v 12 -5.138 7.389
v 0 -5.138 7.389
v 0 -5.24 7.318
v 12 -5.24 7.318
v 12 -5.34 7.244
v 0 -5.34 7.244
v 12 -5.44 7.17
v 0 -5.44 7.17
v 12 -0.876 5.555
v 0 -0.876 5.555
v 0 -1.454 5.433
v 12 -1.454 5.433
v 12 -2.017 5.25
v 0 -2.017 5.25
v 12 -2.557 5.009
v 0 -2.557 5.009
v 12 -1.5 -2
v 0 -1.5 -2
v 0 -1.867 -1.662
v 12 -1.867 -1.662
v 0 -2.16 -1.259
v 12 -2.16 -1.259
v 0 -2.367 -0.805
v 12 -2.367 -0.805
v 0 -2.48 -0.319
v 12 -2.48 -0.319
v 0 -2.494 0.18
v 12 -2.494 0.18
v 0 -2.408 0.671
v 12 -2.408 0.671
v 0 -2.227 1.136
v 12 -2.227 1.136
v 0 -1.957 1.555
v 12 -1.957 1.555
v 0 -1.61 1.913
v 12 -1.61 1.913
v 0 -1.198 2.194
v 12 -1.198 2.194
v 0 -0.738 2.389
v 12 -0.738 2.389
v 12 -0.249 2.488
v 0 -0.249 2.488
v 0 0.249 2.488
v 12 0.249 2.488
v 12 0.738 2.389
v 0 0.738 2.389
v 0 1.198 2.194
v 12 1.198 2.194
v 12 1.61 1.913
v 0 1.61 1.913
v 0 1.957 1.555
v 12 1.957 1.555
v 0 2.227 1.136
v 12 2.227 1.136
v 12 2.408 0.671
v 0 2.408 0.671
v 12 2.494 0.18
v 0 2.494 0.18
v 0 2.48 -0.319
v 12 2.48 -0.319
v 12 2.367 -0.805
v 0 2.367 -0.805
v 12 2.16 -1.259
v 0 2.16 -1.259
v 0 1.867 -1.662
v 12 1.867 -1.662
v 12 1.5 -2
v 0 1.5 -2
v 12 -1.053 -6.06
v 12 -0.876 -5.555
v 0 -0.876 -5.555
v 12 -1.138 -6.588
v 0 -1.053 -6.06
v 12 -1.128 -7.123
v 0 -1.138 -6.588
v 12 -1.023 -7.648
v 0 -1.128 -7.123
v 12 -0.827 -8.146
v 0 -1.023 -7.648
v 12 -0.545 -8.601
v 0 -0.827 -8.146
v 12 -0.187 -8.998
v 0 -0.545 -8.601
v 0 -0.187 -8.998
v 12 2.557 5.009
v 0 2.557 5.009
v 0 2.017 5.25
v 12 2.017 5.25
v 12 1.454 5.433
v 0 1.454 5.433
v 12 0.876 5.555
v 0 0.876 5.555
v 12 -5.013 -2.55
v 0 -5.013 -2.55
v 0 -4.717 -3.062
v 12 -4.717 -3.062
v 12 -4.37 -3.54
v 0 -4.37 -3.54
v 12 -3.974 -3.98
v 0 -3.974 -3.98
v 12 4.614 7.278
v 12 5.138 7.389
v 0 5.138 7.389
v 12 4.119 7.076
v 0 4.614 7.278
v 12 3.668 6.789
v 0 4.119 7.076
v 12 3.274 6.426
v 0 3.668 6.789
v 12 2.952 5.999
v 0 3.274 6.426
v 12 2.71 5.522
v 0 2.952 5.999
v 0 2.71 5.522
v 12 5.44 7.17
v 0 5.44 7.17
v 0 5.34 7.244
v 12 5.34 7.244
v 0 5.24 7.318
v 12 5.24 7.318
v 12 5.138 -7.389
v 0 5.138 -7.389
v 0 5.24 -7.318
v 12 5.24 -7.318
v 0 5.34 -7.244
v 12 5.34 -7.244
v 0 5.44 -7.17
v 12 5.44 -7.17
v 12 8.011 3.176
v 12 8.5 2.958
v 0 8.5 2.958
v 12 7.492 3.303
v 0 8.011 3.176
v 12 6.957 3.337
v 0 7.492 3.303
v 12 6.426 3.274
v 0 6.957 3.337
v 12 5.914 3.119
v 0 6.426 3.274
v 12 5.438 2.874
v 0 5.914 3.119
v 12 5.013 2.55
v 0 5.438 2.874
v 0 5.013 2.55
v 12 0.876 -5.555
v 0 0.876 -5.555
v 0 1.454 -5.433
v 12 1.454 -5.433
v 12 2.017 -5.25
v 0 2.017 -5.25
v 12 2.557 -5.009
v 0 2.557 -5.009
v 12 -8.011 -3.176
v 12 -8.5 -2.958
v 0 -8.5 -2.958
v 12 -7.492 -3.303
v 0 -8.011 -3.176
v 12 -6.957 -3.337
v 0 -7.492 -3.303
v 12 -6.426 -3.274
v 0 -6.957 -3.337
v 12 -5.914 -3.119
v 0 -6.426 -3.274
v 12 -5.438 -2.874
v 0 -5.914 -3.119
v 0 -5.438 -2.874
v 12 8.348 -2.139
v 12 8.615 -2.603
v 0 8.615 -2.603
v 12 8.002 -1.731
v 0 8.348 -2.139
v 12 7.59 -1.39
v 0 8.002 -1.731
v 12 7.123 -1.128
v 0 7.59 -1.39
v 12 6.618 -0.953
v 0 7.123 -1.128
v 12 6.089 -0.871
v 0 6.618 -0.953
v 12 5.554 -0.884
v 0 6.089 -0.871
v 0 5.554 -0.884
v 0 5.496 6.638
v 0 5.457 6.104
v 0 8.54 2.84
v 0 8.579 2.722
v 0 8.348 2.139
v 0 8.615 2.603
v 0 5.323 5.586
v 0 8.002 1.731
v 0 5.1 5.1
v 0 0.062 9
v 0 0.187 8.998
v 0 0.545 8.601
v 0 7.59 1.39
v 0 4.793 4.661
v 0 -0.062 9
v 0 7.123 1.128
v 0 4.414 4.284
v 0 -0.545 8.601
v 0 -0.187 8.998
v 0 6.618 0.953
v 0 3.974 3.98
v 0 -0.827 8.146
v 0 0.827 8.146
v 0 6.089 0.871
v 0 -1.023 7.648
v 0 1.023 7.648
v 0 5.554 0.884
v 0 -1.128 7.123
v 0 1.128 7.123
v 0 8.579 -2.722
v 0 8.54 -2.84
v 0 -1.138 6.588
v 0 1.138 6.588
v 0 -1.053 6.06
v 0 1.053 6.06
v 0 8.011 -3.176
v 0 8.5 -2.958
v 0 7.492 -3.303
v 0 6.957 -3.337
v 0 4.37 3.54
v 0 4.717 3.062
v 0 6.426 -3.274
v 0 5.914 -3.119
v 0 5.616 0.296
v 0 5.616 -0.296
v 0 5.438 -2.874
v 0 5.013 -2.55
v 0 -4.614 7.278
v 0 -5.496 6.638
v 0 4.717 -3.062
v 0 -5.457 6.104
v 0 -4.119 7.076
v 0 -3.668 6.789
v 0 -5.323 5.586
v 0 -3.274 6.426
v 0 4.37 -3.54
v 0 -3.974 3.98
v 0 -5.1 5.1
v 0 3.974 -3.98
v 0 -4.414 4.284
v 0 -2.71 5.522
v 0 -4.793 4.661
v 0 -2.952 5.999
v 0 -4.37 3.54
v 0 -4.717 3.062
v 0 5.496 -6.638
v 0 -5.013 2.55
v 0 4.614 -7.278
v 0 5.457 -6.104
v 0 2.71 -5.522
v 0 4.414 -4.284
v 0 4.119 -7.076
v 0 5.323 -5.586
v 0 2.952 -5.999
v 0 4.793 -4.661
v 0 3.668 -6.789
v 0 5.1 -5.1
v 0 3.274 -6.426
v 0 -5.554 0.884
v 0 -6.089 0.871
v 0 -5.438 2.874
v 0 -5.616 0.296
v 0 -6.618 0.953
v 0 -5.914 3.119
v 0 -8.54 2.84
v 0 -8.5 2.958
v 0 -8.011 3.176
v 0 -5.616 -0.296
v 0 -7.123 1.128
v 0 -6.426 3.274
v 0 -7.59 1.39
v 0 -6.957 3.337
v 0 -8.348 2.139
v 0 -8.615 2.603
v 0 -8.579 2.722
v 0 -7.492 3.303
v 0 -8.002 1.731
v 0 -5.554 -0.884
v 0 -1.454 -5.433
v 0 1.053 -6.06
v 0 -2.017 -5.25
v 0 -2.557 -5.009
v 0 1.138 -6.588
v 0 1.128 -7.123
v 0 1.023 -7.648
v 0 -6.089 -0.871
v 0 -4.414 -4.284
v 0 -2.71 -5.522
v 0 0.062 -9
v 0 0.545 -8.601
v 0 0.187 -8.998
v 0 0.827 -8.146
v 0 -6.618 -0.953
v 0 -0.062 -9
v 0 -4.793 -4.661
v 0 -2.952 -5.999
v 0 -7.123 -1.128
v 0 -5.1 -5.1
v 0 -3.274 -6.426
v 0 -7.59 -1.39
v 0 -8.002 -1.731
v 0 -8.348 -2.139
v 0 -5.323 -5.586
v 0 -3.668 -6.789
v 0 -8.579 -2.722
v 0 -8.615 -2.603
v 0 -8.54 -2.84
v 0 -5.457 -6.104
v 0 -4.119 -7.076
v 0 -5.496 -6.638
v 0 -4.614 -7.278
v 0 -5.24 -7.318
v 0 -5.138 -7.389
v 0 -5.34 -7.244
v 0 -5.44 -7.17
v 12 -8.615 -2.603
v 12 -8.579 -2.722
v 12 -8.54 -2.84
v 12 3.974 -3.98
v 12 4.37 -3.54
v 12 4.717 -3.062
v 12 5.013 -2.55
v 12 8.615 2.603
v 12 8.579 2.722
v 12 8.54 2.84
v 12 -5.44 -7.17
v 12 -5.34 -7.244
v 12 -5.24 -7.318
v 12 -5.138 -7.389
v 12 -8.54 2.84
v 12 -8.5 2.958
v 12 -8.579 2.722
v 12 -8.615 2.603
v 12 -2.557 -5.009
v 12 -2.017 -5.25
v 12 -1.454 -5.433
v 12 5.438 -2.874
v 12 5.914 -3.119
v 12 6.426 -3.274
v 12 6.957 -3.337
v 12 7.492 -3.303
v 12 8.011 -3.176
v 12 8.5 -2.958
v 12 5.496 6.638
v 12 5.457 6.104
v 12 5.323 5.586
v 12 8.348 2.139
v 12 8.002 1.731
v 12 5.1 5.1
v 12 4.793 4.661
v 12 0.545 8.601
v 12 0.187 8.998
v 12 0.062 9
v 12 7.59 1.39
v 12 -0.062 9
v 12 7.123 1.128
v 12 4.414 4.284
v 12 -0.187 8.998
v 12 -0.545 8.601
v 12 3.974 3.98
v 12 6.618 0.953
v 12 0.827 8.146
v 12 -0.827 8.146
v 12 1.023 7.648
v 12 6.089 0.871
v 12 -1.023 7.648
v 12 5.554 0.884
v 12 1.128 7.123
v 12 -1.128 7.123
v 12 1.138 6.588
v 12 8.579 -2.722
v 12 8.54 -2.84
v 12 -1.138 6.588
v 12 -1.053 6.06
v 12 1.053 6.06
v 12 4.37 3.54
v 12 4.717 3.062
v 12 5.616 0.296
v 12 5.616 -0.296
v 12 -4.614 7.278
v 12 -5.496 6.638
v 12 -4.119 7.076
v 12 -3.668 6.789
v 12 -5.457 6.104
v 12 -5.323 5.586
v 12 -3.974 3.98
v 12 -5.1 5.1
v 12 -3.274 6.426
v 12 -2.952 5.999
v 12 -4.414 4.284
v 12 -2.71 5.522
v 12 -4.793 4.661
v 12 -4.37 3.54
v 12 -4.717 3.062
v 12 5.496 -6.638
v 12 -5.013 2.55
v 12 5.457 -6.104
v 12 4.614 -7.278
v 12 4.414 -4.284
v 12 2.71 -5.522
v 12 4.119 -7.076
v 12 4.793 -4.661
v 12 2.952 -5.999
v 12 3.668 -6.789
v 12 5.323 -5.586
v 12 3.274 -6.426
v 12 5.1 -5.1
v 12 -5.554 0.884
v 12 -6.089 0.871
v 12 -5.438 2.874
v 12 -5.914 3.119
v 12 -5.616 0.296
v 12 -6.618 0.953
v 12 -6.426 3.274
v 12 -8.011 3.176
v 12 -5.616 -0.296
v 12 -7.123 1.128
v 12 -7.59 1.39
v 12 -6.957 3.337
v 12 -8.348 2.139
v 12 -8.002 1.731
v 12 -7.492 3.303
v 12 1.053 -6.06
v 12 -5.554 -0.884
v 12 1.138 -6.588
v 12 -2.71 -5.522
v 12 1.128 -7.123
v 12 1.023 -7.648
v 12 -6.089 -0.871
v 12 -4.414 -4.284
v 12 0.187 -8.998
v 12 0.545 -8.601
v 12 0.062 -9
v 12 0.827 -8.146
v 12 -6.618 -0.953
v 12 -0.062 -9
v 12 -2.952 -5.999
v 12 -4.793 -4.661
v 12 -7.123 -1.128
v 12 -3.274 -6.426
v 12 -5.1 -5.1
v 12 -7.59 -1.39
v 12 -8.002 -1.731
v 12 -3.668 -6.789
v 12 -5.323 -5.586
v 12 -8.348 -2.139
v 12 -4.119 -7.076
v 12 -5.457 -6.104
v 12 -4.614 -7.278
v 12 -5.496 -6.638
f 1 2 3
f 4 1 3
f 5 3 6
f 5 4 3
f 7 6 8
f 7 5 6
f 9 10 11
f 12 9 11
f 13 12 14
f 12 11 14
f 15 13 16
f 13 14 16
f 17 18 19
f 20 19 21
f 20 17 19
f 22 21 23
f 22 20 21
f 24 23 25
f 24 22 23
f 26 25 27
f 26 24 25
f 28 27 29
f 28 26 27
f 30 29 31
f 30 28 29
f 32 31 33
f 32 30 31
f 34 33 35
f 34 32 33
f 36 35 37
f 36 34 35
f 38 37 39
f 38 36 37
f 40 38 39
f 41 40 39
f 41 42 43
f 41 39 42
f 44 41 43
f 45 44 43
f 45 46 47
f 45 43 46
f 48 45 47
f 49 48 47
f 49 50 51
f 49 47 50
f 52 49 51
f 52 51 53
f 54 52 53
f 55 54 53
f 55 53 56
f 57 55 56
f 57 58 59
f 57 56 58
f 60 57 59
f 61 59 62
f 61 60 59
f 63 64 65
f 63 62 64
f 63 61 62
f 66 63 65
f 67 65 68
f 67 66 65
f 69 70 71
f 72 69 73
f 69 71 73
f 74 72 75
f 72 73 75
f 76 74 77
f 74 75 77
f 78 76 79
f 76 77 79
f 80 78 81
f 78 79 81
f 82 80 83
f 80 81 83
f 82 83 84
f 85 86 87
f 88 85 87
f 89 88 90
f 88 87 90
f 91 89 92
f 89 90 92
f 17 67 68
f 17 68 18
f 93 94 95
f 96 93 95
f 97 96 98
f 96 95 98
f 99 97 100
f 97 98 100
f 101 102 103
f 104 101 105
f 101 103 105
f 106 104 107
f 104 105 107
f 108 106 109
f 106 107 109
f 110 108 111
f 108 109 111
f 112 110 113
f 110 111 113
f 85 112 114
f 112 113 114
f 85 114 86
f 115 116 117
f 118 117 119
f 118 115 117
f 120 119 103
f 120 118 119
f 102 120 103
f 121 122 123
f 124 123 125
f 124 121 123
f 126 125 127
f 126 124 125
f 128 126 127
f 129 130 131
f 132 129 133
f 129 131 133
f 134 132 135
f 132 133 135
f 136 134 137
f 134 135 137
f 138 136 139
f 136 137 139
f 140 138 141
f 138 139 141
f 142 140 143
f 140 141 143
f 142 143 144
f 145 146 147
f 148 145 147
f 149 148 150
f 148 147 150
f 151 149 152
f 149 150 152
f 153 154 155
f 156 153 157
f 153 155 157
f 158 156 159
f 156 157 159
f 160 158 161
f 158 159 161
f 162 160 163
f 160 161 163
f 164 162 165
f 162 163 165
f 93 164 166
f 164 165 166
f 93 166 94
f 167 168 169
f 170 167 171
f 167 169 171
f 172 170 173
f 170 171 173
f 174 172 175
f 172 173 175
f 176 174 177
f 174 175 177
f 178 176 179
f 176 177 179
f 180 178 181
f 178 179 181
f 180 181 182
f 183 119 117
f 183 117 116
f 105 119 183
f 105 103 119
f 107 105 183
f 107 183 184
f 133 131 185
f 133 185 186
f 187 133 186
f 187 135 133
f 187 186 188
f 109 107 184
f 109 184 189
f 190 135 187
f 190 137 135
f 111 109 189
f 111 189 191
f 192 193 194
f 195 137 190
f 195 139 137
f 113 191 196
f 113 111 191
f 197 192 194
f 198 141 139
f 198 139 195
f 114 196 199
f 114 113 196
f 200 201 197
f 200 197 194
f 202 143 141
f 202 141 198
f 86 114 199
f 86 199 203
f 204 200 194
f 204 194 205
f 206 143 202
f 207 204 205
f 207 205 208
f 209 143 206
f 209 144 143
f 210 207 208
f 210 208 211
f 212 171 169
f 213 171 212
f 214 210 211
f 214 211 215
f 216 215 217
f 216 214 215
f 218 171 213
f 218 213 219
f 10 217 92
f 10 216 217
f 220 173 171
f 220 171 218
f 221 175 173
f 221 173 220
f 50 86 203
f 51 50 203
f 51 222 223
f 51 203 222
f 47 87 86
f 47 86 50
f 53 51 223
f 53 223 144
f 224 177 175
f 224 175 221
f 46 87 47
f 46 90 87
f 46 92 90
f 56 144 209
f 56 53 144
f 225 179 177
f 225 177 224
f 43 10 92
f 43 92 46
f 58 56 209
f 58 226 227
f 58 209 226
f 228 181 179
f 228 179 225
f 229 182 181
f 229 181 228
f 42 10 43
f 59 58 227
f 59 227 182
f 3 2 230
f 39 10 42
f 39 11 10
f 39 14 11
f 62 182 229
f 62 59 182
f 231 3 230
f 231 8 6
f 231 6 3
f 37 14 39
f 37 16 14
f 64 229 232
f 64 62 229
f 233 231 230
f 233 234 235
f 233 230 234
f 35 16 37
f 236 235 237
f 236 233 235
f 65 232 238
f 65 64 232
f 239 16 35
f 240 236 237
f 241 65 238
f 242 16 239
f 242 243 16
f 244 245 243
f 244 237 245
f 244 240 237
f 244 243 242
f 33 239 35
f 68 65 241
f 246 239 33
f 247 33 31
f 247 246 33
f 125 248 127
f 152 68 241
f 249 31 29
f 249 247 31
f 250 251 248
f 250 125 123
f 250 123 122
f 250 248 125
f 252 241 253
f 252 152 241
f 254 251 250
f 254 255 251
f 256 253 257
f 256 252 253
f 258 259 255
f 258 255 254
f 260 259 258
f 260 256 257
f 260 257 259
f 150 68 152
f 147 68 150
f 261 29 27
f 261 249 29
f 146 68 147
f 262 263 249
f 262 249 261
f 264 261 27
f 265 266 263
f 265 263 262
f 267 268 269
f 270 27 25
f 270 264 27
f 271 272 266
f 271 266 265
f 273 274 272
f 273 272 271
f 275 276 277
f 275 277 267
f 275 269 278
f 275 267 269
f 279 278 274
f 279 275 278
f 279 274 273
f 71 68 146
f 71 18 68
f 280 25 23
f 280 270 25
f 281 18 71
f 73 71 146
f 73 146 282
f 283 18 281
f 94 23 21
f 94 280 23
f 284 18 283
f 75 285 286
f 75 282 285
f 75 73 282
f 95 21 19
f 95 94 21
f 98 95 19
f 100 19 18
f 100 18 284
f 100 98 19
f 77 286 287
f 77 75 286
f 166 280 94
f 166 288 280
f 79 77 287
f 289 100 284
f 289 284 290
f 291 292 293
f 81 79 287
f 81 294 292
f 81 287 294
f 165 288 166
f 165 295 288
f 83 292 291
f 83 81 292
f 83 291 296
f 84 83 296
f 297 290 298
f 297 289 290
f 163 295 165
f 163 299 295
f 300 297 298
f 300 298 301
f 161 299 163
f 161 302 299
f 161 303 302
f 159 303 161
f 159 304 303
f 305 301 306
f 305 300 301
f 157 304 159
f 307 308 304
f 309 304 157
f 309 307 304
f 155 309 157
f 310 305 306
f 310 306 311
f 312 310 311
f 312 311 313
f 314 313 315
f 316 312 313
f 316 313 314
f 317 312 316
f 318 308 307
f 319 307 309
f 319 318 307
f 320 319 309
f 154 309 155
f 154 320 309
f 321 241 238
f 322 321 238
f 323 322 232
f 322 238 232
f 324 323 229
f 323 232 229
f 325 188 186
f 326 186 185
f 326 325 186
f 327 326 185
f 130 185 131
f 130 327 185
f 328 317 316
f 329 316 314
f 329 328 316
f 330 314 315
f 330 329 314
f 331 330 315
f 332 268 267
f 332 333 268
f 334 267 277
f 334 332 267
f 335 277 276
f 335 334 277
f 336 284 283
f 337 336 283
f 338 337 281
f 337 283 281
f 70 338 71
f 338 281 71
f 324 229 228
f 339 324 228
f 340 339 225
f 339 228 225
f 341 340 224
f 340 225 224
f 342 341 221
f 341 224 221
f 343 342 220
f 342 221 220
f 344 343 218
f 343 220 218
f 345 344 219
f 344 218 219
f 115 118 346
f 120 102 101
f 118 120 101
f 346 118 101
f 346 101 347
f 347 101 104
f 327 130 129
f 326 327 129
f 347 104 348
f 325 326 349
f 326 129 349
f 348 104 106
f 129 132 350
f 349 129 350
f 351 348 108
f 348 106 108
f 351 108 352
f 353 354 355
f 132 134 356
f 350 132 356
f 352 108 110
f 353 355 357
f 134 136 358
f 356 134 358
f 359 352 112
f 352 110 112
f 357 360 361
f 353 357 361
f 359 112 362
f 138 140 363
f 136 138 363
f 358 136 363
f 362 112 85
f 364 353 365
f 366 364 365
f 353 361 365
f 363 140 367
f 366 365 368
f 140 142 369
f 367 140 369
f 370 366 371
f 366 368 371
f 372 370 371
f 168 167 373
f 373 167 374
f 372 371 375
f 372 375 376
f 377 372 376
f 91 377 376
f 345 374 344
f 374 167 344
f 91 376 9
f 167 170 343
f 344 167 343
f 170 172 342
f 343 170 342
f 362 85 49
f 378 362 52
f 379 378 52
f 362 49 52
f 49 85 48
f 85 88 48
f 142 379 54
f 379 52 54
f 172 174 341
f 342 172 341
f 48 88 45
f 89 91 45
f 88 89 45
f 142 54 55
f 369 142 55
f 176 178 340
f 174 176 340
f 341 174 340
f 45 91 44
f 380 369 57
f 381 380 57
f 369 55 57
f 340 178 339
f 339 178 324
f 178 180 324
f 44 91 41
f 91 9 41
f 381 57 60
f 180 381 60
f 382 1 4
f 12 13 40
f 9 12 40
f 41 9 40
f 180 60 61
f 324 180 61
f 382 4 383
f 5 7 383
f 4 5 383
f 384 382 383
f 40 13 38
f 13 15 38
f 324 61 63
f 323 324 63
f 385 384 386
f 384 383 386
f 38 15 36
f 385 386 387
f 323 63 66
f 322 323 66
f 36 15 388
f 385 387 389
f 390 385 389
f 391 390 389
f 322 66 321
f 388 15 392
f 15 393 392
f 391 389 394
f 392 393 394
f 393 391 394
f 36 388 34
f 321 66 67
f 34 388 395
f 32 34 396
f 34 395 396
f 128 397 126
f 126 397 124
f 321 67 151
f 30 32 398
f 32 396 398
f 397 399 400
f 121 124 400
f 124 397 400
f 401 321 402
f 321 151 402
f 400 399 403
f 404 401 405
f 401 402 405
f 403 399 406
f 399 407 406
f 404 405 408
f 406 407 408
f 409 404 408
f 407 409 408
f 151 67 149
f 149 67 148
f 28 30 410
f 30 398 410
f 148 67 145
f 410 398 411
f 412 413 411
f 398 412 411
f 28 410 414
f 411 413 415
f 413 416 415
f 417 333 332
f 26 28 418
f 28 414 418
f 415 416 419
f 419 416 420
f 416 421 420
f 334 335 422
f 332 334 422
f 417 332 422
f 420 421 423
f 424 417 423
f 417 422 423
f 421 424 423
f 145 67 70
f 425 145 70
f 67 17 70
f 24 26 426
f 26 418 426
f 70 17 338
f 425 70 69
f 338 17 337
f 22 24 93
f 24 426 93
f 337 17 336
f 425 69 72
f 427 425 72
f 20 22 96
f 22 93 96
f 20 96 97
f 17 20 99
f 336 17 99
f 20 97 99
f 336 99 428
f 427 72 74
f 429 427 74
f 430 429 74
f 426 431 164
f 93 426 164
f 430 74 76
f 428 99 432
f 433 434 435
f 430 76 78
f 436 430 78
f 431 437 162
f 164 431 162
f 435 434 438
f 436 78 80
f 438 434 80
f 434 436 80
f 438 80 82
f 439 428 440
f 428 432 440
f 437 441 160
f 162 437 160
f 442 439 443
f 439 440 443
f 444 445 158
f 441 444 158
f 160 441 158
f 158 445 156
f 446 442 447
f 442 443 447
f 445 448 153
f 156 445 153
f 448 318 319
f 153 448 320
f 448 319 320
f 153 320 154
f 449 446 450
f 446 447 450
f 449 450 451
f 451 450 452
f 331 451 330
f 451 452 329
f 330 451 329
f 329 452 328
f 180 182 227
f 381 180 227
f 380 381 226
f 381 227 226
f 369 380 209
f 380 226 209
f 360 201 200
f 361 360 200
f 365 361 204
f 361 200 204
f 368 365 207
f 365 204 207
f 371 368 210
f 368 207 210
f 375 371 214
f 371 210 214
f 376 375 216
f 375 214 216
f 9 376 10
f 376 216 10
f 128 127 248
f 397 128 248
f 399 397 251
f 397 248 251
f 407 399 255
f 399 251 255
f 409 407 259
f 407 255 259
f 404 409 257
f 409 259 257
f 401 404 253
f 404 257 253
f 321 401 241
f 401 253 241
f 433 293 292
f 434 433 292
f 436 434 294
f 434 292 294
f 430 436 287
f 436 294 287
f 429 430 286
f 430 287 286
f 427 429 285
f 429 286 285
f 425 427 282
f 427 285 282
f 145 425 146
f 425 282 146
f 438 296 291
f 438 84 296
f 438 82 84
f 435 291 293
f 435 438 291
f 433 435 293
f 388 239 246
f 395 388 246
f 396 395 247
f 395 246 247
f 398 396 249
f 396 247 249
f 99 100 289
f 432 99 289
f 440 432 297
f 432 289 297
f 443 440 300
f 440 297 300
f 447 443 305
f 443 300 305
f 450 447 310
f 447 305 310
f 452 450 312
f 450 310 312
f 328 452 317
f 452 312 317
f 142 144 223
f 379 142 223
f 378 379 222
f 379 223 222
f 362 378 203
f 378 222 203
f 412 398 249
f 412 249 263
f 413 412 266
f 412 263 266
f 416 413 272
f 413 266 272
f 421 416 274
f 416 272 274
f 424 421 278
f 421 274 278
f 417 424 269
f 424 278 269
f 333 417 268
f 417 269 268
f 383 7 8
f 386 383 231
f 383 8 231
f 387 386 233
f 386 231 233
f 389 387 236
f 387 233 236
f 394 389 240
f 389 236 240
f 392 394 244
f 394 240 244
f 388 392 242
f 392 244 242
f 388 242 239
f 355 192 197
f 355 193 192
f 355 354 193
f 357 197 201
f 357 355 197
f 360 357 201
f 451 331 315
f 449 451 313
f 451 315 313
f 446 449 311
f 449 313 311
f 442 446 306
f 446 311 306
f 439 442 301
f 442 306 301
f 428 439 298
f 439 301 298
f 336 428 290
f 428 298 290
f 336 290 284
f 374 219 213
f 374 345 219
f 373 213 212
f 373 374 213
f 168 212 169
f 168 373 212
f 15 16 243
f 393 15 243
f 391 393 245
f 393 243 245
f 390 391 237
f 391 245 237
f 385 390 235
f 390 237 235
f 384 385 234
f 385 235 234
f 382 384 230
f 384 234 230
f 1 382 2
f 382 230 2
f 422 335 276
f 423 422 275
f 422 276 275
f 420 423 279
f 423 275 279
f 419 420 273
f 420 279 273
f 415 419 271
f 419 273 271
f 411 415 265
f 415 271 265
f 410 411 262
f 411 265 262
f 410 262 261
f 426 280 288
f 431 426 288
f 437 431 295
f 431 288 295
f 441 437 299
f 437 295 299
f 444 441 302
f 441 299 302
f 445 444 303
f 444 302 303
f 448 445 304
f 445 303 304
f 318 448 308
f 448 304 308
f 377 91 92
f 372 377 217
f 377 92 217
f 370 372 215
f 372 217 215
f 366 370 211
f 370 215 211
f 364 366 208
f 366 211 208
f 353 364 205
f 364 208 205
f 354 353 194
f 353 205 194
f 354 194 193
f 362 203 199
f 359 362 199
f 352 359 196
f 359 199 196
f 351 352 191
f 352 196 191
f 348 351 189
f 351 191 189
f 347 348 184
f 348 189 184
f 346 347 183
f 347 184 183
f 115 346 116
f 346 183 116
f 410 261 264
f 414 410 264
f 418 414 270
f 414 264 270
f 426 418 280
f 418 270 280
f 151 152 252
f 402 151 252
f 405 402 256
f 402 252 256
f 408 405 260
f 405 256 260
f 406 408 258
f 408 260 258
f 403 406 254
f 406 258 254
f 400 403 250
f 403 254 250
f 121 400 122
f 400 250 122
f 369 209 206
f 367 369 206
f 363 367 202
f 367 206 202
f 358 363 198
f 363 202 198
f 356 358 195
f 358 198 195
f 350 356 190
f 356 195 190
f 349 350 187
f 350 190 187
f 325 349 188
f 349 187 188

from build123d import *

# Parameters (mm, degrees)
BASPROSKE_W        = 12
BASPROSKE_H        = 9
TOOTHCUT_DEPTH     = 18.492855685
TEETHCUTS_COUNT    = 10
TEETHCUTS_ANGLE    = 324
BORSKE_R           = 2
BORE_DEPTH         = 50.0000508
CUT_EXTRUDE1_DEPTH = 18


with BuildPart() as part:
    # BasProSke → Base-Revolve (revolve)
    with BuildSketch(Plane(origin=(0, 0, 0), x_dir=(1, 0, 0), z_dir=(0, 1, 0)), mode=Mode.PRIVATE) as base_revolve_sk:
        with Locations((6, 4.5)):
            Rectangle(BASPROSKE_W, BASPROSKE_H)
    revolve(base_revolve_sk.sketch.rotate(Axis((-10, 0, 0), (1, 0, 0)), 180), axis=Axis((-10, 0, 0), (1, 0, 0)))

    # TooCutSke → ToothCut (cut, through all)
    with BuildSketch(Plane(origin=(0, 0, 0), x_dir=(0, 0, -1), z_dir=(1, 0, 0))):
        with BuildLine():
            ThreePointArc((0.883878355, 5.554109745), (0, 5.624), (-0.883878355, 5.554109745))
            ThreePointArc((-0.883878355, 5.554109745), (-1.258245767, 7.379188248), (-2.637816971, 8.631324741))
            ThreePointArc((-2.637816971, 8.631324741), (0, 9.0254), (2.637816971, 8.631324741))
            ThreePointArc((2.637816971, 8.631324741), (1.258245767, 7.379188248), (0.883878355, 5.554109745))
        make_face()
    toothcut = extrude(amount=TOOTHCUT_DEPTH, mode=Mode.SUBTRACT)

    # TeethCuts: ToothCut ×10 about axis
    teethcuts_axis = Axis((-10, 0, 0), (1, 0, 0))
    for i in range(1, TEETHCUTS_COUNT):
        add(toothcut.rotate(teethcuts_axis, i * TEETHCUTS_ANGLE / (TEETHCUTS_COUNT - 1)), mode=Mode.SUBTRACT)

    # BorSke → Bore (cut, symmetric)
    with BuildSketch(Plane(origin=(0, 0, 0), x_dir=(0, 0, -1), z_dir=(1, 0, 0))):
        with Locations(Location((0, 0, 0), (0, 0, 180))):
            Circle(BORSKE_R)
    extrude(amount=BORE_DEPTH, both=True, mode=Mode.SUBTRACT)

    # Sketch1 → Cut-Extrude1 (cut)
    with BuildSketch(Plane(origin=(12, 0, 0), x_dir=(0, 0, -1), z_dir=(1, 0, 0))):
        with BuildLine():
            Line((2, 1.5), (2, -1.5))
            ThreePointArc((2, -1.5), (-2.5, 0), (2, 1.5))
        make_face()
    extrude(amount=-CUT_EXTRUDE1_DEPTH, mode=Mode.SUBTRACT)


solid = part.part
